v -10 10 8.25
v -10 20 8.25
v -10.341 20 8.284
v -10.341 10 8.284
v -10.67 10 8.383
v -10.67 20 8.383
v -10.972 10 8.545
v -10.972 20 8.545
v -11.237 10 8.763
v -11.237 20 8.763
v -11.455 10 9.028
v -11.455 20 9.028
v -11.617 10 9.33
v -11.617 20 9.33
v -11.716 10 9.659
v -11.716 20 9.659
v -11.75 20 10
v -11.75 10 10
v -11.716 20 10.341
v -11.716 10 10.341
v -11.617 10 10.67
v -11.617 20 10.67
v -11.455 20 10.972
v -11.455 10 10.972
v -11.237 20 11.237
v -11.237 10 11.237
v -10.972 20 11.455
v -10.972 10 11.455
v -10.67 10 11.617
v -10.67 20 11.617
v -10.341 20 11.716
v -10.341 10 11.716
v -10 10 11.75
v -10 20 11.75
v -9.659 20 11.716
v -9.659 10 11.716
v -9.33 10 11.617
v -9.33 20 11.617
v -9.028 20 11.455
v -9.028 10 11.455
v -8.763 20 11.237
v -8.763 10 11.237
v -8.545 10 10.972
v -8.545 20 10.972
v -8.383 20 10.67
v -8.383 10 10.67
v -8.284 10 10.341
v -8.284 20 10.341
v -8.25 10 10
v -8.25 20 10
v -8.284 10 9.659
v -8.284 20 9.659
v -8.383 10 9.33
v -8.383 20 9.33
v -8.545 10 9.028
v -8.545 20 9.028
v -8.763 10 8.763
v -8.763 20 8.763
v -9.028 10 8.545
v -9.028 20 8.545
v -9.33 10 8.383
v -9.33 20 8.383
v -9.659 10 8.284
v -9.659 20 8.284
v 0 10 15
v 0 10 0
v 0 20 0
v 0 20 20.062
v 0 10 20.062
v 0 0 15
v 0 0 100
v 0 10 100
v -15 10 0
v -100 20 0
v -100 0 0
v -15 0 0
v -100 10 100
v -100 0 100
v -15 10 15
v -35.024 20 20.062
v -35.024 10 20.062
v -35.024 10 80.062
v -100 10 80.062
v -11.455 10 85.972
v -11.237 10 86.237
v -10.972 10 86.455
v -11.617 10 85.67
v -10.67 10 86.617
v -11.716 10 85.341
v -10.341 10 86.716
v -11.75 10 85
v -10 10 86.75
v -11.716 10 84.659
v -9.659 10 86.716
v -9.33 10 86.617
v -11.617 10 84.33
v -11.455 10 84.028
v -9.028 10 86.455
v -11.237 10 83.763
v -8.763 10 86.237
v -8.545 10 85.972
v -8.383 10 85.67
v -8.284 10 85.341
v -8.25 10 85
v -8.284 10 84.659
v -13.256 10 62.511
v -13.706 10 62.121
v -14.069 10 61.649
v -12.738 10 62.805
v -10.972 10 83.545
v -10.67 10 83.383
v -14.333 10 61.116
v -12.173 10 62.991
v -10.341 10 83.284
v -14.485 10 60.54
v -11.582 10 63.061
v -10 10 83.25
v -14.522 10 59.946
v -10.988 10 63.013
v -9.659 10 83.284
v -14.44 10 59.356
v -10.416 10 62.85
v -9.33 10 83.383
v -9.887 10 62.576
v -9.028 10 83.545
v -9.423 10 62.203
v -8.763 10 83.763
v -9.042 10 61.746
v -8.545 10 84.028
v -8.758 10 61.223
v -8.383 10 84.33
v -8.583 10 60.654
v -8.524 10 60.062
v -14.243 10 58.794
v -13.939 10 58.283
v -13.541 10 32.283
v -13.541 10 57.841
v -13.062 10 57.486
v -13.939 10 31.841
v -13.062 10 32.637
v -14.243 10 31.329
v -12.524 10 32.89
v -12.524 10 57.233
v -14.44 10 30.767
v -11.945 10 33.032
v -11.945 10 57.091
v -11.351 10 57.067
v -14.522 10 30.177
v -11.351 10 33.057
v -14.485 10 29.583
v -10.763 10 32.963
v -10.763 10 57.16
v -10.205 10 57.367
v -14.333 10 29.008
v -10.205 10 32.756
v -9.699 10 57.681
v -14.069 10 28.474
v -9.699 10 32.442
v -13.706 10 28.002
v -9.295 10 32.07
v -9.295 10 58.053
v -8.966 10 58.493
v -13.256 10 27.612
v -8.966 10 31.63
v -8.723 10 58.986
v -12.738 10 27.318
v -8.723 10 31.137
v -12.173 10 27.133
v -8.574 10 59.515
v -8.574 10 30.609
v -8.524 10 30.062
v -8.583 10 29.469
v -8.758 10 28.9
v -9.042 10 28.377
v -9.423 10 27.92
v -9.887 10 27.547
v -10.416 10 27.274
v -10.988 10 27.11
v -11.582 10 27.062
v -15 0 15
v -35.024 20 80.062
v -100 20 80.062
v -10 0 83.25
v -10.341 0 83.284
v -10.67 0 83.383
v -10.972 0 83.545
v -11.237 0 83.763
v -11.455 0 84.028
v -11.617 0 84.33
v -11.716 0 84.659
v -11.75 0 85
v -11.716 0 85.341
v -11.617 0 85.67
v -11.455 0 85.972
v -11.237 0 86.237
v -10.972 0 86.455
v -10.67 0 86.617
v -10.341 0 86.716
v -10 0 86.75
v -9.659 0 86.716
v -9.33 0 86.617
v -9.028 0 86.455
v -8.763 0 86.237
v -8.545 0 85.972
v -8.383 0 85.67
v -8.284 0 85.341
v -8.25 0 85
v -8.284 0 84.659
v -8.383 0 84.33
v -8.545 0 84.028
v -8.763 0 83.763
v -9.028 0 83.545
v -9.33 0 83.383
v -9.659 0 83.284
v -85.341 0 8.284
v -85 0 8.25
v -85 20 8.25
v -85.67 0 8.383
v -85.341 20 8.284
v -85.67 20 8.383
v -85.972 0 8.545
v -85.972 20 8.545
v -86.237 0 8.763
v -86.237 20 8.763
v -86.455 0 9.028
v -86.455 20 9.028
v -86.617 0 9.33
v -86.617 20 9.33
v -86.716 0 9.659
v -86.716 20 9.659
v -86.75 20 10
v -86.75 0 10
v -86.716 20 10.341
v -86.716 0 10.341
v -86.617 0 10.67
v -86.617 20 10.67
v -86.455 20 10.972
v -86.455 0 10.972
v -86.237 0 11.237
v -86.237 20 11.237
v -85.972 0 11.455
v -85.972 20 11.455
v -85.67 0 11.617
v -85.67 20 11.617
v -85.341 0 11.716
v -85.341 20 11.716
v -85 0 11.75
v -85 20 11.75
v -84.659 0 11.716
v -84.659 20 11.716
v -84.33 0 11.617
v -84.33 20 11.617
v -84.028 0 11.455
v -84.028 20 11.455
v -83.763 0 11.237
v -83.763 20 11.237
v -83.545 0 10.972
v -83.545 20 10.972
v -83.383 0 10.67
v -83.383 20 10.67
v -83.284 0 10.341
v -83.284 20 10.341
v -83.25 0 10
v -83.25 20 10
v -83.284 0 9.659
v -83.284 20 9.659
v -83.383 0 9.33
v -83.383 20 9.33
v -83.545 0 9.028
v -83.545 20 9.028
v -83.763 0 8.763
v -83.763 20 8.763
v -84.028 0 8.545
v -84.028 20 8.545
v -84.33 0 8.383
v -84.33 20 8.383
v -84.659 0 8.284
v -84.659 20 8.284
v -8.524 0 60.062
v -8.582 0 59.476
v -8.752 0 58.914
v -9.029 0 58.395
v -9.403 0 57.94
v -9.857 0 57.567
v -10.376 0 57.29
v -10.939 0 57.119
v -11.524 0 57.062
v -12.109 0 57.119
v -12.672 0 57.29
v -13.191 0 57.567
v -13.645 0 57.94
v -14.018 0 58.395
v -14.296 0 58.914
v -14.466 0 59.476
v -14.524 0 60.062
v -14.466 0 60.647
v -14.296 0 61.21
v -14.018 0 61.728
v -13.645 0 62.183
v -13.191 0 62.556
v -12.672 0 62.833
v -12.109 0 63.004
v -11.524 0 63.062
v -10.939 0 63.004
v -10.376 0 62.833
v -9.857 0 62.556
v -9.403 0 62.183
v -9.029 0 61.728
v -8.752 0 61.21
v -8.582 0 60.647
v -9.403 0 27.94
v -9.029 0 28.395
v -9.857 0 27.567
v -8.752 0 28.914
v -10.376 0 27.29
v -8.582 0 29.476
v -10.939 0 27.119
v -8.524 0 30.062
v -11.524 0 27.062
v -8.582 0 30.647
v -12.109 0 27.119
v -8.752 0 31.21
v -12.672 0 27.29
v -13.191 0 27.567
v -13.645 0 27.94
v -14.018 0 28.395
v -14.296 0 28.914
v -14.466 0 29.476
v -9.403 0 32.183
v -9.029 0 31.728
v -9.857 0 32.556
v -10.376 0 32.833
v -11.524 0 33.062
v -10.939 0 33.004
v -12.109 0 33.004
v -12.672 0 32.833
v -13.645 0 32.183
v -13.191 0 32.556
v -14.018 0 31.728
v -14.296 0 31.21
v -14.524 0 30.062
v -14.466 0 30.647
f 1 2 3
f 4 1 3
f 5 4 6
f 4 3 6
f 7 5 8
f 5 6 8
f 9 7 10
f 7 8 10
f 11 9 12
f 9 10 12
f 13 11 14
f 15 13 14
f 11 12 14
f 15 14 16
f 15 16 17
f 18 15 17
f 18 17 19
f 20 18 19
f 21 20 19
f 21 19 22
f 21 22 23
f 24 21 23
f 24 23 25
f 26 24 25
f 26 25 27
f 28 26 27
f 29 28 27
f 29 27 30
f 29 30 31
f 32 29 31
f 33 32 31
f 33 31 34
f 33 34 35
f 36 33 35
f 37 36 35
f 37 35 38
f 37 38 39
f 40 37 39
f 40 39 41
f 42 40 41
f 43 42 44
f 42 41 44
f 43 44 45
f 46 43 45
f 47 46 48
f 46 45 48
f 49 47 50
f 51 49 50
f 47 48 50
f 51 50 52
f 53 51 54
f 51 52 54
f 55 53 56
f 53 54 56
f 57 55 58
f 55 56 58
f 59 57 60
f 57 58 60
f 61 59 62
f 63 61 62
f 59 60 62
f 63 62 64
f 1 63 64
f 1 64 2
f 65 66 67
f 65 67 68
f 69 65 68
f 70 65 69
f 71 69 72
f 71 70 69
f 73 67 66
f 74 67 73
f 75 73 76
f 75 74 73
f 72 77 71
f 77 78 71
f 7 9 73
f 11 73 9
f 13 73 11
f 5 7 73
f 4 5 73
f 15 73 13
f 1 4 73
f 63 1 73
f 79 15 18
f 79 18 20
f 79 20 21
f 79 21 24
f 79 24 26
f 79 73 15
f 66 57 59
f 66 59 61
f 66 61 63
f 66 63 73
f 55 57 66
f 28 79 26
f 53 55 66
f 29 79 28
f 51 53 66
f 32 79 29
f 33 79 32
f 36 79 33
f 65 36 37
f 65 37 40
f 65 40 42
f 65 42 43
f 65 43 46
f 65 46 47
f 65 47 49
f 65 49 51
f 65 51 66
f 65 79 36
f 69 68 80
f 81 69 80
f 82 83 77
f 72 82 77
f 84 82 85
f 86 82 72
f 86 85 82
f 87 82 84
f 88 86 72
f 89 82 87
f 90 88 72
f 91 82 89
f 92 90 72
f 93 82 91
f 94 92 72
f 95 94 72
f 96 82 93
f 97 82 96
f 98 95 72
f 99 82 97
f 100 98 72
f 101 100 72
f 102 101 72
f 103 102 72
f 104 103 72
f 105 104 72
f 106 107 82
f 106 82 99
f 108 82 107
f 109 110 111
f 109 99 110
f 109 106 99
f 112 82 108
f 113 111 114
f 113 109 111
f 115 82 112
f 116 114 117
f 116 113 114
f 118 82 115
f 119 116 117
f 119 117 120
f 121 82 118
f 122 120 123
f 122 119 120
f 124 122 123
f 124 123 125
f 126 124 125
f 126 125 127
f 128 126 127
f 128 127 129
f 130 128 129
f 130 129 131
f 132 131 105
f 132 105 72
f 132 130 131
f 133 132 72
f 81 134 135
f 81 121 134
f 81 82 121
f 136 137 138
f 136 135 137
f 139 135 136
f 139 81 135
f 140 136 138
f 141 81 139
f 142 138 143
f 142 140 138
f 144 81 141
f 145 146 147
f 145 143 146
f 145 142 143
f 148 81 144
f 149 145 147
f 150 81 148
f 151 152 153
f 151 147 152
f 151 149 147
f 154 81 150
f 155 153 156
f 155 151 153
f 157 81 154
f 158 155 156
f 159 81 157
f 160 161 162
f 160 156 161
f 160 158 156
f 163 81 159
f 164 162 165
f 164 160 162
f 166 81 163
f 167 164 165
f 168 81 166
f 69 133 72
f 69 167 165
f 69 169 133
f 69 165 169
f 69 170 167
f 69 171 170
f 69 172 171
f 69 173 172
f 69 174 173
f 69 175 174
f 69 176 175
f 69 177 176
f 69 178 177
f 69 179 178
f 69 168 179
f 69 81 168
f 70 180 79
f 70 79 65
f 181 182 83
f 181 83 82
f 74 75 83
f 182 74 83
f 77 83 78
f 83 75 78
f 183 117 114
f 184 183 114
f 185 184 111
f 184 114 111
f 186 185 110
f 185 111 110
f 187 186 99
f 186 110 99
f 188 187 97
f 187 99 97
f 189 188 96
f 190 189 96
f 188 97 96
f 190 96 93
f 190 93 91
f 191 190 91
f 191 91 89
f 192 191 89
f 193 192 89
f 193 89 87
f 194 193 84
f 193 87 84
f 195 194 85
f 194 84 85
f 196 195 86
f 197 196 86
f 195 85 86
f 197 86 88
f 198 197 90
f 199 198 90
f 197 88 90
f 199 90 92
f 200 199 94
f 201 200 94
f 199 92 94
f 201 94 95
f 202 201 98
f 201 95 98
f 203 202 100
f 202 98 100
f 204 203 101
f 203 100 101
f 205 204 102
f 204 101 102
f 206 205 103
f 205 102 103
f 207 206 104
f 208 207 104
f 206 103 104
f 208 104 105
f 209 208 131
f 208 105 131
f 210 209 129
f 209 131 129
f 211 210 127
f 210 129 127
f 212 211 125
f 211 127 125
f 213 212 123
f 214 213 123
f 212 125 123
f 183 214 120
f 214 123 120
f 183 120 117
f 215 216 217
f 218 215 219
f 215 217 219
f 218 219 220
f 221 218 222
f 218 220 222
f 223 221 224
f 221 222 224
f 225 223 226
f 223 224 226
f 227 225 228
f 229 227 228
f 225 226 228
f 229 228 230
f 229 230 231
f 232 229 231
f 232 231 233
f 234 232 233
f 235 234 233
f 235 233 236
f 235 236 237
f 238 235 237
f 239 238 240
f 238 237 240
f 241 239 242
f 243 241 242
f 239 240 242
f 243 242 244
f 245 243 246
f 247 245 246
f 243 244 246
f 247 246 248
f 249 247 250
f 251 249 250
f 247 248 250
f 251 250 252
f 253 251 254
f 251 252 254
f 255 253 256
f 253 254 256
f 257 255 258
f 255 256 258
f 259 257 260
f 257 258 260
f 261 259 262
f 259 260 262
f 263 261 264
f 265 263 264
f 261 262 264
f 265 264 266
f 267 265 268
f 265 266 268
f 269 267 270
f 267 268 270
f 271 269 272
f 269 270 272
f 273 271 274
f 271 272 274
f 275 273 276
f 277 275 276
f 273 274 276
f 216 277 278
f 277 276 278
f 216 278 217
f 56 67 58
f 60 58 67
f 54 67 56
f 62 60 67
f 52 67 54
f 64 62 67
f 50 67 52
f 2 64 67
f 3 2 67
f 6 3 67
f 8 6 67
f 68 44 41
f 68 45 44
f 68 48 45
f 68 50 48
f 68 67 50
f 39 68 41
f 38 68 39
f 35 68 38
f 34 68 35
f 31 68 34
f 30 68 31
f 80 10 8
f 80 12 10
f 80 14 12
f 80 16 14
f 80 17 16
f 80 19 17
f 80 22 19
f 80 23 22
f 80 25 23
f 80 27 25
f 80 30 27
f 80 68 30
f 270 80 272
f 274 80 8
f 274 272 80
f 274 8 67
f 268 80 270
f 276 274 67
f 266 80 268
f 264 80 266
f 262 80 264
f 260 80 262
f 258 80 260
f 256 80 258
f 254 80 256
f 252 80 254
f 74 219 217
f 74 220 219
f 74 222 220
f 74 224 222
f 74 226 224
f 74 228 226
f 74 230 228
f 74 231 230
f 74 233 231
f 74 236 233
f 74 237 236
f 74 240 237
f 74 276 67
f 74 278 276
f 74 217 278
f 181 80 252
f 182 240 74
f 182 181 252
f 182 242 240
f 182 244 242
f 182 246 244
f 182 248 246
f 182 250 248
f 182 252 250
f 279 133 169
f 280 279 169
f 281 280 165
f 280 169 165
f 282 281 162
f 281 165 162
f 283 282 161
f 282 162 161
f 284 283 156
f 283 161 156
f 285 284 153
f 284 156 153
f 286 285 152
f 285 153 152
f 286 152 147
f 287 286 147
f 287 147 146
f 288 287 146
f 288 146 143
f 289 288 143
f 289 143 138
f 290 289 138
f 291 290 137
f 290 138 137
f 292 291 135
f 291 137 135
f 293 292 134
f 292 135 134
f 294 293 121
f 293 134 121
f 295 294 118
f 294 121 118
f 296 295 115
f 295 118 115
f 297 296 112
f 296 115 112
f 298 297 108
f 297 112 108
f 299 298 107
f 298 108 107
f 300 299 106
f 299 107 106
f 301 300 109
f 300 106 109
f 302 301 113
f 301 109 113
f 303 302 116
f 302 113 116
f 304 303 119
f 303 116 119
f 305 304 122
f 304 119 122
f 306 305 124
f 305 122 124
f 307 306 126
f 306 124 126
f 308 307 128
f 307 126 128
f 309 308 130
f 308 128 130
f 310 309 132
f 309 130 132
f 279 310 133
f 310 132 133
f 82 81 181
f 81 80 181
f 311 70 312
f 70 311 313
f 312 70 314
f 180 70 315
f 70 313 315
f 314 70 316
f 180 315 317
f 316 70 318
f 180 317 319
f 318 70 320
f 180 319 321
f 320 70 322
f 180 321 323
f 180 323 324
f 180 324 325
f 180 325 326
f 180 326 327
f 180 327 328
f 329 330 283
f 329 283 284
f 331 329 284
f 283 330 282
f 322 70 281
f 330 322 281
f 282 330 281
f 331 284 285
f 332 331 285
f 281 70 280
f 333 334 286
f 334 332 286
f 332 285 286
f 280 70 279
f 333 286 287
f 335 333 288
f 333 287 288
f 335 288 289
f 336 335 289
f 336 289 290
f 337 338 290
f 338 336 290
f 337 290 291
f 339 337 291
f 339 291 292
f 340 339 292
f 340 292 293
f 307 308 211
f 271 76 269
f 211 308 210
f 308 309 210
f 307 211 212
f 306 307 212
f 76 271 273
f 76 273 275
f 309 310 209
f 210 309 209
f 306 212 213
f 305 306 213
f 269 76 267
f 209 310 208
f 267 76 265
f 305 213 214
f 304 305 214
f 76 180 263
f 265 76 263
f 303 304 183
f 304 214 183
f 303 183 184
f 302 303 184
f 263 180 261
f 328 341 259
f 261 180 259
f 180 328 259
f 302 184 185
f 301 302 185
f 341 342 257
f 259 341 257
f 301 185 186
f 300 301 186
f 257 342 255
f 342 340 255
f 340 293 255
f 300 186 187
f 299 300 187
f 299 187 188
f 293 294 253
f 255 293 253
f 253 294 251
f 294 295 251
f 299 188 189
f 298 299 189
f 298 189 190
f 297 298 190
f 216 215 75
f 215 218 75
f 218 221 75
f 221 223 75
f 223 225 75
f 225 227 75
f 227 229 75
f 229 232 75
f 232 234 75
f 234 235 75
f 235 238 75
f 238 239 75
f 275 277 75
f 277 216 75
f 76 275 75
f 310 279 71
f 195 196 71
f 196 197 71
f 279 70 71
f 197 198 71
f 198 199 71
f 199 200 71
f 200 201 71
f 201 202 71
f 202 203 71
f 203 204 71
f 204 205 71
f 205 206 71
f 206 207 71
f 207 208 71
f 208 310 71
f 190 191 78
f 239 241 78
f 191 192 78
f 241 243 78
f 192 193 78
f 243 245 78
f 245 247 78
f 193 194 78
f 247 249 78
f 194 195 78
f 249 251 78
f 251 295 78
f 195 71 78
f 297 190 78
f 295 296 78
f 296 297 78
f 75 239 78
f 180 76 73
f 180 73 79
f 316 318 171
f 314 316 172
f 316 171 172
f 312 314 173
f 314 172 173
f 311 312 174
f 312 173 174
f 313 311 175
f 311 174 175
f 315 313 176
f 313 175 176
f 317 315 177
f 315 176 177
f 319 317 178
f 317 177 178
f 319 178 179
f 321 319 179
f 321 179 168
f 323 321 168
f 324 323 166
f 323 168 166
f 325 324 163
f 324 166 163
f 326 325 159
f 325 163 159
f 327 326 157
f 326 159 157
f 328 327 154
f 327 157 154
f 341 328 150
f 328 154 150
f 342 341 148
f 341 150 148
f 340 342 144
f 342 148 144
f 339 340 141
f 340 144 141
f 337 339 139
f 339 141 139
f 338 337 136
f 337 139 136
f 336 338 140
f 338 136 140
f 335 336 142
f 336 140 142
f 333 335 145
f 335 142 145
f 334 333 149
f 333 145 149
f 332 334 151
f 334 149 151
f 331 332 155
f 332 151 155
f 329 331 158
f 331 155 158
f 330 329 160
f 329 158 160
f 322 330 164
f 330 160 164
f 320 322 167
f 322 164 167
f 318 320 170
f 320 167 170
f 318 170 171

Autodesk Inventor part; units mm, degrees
ref_plane "YZ Plane" through (0, 0, 0) normal (1, 0, 0) x (0, 1, 0)
ref_plane "XZ Plane" through (0, 0, 0) normal (0, 1, 0) x (-1, 0, 0)
ref_plane "XY Plane" through (0, 0, 0) normal (0, 0, 1) x (1, 0, 0)
sketch "Boceto1" plane through (0, 0, 0) normal (0, 1, 0) x (-1, 0, 0)
  line L0 (100, 100) -> (-100, 100)
  line L1 (-100, 100) -> (-100, -100)
  line L2 (-100, -100) -> (100, -100)
  line L3 (100, -100) -> (100, 100)
  line L4 (100, 100) -> (-100, -100) construction
  line L5 (-100, 100) -> (100, -100) construction
  point P0 (0, 0)
  dimension "d0" = 200
  dimension "d1" = 200
extrude "Extrusión1" add sketch "Boceto1" along normal blind 20
sketch "Boceto2" plane through (0, 20, 0) normal (0, 1, 0) x (1, 0, 0)
  circle A0 centre (-11.5239, -30.0616) radius 3
  circle A1 centre (11.4761, -30.0616) radius 3
  circle A2 centre (-11.5239, -60.0616) radius 3
  circle A3 centre (11.4761, -60.0616) radius 3
  line L0 (-0.0239, -45.0616) -> (-35.0239, -45.0616)
  line L1 (-35.0239, -45.0616) -> (-35.0239, -80.0616)
  line L2 (-0.0239, -45.0616) -> (34.9761, -45.0616)
  line L3 (-11.5239, -30.0616) -> (11.4761, -60.0616)
  line L4 (-11.5239, -60.0616) -> (11.4761, -30.0616)
  line L5 (34.9761, -20.0616) -> (-35.0239, -20.0616)
  line L6 (-35.0239, -20.0616) -> (-35.0239, -80.0616)
  line L7 (34.9761, -80.0616) -> (34.9761, -20.0616)
  line L8 (-105, -100.0616) -> (105, -100.0616)
  line L9 (-105.0239, -80.0616) -> (104.9761, -80.0616)
  line L10 (-35.0239, -80.0616) -> (34.9761, -80.0616)
  line L11 (105, -100.0616) -> (95.8154, -100.0616)
  line L12 (-105.0239, -80.0616) -> (104.9761, -80.0616)
  line L13 (105, -80.0616) -> (-105, -80.0616)
  line L14 (-105, -100.0616) -> (105, -100.0616)
  line L15 (105, -90.0616) -> (94.0798, -90.0616)
  line L16 (-105, -100.0616) -> (105, -100.0616)
  line L17 (-105, -80.0616) -> (105, -80.0616)
  line L18 (105, -80.0616) -> (105, -100.0616)
  line L19 (105, -100.0616) -> (-105, -100.0616)
  line L20 (-105, -100.0616) -> (-105, -80.0616)
  line L21 (-100, 100) -> (-100, -100) projected
  line L22 (-100, -100) -> (100.4077, -100)
  point P0 (0, 0)
  point P1 (0, -10.0616)
  point P2 (0, -90.0616)
  point P3 (-0.0478, -80.0616)
  dimension "d4" = 20
  dimension "d5" = 20
  dimension "d6" = 30
  dimension "d7" = 30
  dimension "d8" = 20
  dimension "d9" = 35
  dimension "d10" = 35
  dimension "d11" = 60
extrude "Extrusión2" cut sketch "Boceto2" against normal blind 10
sketch "Boceto3" plane through (0, 20, 0) normal (0, 1, 0) x (1, 0, 0)
  circle A0 centre (-11.5239, -30.0616) radius 3 projected
  circle A1 centre (-11.5239, -30.0616) radius 3
  circle A2 centre (11.4761, -30.0616) radius 3 projected
  circle A3 centre (11.4761, -30.0616) radius 3
  circle A4 centre (11.4761, -60.0616) radius 3 projected
  circle A5 centre (11.4761, -60.0616) radius 3
  circle A6 centre (-11.5239, -60.0616) radius 3
  point P0 (0, 0)
extrude "Extrusión3" cut sketch "Boceto3" against normal blind 20
sketch "Boceto4" plane through (0, 20, 0) normal (0, 1, 0) x (1, 0, 0)
  circle A0 centre (-51.75, 78.25) radius 1.75
  line L0 (-50, 70) -> (-60, 70)
  line L1 (-60, 70) -> (-60, 80)
  line L2 (-60, 80) -> (-50, 80)
  line L3 (-50, 80) -> (-50, 70)
  line L4 (-50, 70) -> (-60, 80) construction
  line L5 (-60, 70) -> (-50, 80) construction
  line L6 (-105, 90) -> (-105, -90)
  circle A1 centre (-58.25, 71.75) radius 1.75
  line L7 (0, 90) -> (0, 77.3124)
  circle A2 centre (51.75, 78.25) radius 1.75
  line L8 (50, 70) -> (60, 70)
  line L9 (60, 70) -> (60, 80)
  line L10 (60, 80) -> (50, 80)
  line L11 (50, 80) -> (50, 70)
  line L12 (50, 70) -> (60, 80) construction
  line L13 (60, 70) -> (50, 80) construction
  circle A3 centre (58.25, 71.75) radius 1.75
  line L14 (100, 100) -> (-100, 100) projected
  line L15 (-100, 100) -> (-100, -80.0616) projected
  line L16 (100, -80.0616) -> (100, 100) projected
  point P0 (0, 0)
  point P1 (0, 0)
  point P2 (-60, 75)
  point P3 (60, 75)
  dimension "d16" = 3.5
  dimension "d18" = 1.75
  dimension "d19" = 1.75
  dimension "d20" = 1.75
  dimension "d21" = 1.75
  dimension "d22" = 10
  dimension "d23" = 10
  dimension "d25" = 20
  dimension "d26" = 40
  dimension "d27" = 40
hole "Agujero1" at (-58.25, 20, -71.75) at (-51.75, 20, -78.25) at (58.25, 20, -71.75) at (51.75, 20, -78.25) direction (0, -1, 0) diameter 3.5 end through all
sketch "Boceto5" plane through (0, 20, 0) normal (0, 1, 0) x (1, 0, 0)
  line L0 (0, 90) -> (0, 68.25)
  circle A0 centre (-51.75, 78.25) radius 1.75 projected
  line L1 (-50, 78.25) -> (-50, 100)
  circle A1 centre (-58.25, 71.75) radius 1.75 projected
  line L2 (-60, 71.75) -> (-60, 100)
  line L3 (-60, 100) -> (-70, 100)
  line L4 (-50, 100) -> (-40, 100)
  line L5 (-40, 100) -> (-40, 60)
  line L6 (-40, 60) -> (-70, 60)
  line L7 (-70, 60) -> (-70, 100)
  line L8 (-70, 100) -> (-40, 100)
  circle A2 centre (51.75, 78.25) radius 1.75
  line L9 (50, 78.25) -> (50, 100)
  circle A3 centre (58.25, 71.75) radius 1.75
  line L10 (60, 71.75) -> (60, 100)
  line L11 (60, 100) -> (70, 100)
  line L12 (50, 100) -> (40, 100)
  line L13 (40, 100) -> (40, 60)
  line L14 (40, 60) -> (70, 60)
  line L15 (70, 60) -> (70, 100)
  line L16 (70, 100) -> (40, 100)
  point P0 (0, 0)
  dimension "d38" = 10
  dimension "d39" = 10
  dimension "d40" = 40
extrude "Extrusión4" cut sketch "Boceto5" against normal blind 10
ref_plane "Plano de trabajo1" through (0, 0, -100) normal (-1, 0, 0) x (0, 0, 1)
ref_plane "Plano de trabajo2" through (100, 0, 0) normal (0, 0, -1) x (-1, 0, 0)
sketch "Boceto7" plane through (0, 0, 0) normal (0, -1, 0) x (1, 0, 0)
  circle A0 centre (10, -10) radius 1.75
  line L0 (6.803, 0) -> (14.6069, 0)
  line L1 (0, 0) -> (0, -4.8284)
  line L2 (0, 0) -> (20.0354, 0)
  circle A1 centre (10, 10) radius 1.75
  line L3 (0, 0) -> (0, 4.8284)
  circle A2 centre (-10, -10) radius 1.75
  circle A3 centre (-10, 10) radius 1.75
  dimension "d52" = 3.5
  dimension "d54" = 10
  dimension "d55" = 10
hole "Agujero2" at (10, 0, -10) at (10, 0, 10) at (-10, 0, 10) at (-10, 0, -10) direction (0, 1, 0) diameter 3.5 end through all
sketch "Boceto8" plane through (0, 0, 0) normal (0, -1, 0) x (1, 0, 0)
  line L0 (-15, 15) -> (15, 15)
  line L1 (15, 15) -> (15, -15)
  line L2 (15, -15) -> (-15, -15)
  line L3 (-15, -15) -> (-15, 15)
  line L4 (-15, 15) -> (15, -15) construction
  line L5 (15, 15) -> (-15, -15) construction
  point P0 (0, 0)
  dimension "d63" = 30
  dimension "d64" = 30
extrude "Extrusión5" cut sketch "Boceto8" against normal blind 10
sketch "Boceto9" plane through (0, 0, 0) normal (0, -1, 0) x (1, 0, 0)
  circle A0 centre (85, -10) radius 1.75
  line L0 (100, 100) -> (100, -100) projected
  line L1 (140, 0) -> (-140, 0) projected
  circle A1 centre (85, 10) radius 1.75
  line L2 (0, 0) -> (0, 9.4908)
  circle A2 centre (-85, -10) radius 1.75
  circle A3 centre (-85, 10) radius 1.75
  line L3 (0, 0) -> (6.3157, 6.3157)
  line L4 (0, 0) -> (8.9318, 0) construction
  circle A4 centre (10, 85) radius 1.75
  circle A5 centre (-10, -85) radius 1.75
  line L5 (0, 0) -> (5.9531, -5.9531)
  line L6 (0, 0) -> (8.419, 0) construction
  circle A6 centre (10, -85) radius 1.75
  circle A7 centre (-10, 85) radius 1.75
  dimension "d67" = 3.5
  dimension "d68" = 15
  dimension "d69" = 10
  dimension "d70" = 45
  dimension "d71" = 45
hole "Agujero3" at (-10, 0, 85) at (10, 0, 85) at (85, 0, 10) at (85, 0, -10) at (-85, 0, 10) at (-85, 0, -10) at (-10, 0, -85) at (10, 0, -85) direction (0, 1, 0) diameter 3.5 end through all
split "Dividir3" plane through (100, 0, 0) removes the side toward (0, 0, -1)
split "Dividir4" plane through (0, 0, -100) removes the side toward (1, 0, 0)
properties part number "base_front_3"
